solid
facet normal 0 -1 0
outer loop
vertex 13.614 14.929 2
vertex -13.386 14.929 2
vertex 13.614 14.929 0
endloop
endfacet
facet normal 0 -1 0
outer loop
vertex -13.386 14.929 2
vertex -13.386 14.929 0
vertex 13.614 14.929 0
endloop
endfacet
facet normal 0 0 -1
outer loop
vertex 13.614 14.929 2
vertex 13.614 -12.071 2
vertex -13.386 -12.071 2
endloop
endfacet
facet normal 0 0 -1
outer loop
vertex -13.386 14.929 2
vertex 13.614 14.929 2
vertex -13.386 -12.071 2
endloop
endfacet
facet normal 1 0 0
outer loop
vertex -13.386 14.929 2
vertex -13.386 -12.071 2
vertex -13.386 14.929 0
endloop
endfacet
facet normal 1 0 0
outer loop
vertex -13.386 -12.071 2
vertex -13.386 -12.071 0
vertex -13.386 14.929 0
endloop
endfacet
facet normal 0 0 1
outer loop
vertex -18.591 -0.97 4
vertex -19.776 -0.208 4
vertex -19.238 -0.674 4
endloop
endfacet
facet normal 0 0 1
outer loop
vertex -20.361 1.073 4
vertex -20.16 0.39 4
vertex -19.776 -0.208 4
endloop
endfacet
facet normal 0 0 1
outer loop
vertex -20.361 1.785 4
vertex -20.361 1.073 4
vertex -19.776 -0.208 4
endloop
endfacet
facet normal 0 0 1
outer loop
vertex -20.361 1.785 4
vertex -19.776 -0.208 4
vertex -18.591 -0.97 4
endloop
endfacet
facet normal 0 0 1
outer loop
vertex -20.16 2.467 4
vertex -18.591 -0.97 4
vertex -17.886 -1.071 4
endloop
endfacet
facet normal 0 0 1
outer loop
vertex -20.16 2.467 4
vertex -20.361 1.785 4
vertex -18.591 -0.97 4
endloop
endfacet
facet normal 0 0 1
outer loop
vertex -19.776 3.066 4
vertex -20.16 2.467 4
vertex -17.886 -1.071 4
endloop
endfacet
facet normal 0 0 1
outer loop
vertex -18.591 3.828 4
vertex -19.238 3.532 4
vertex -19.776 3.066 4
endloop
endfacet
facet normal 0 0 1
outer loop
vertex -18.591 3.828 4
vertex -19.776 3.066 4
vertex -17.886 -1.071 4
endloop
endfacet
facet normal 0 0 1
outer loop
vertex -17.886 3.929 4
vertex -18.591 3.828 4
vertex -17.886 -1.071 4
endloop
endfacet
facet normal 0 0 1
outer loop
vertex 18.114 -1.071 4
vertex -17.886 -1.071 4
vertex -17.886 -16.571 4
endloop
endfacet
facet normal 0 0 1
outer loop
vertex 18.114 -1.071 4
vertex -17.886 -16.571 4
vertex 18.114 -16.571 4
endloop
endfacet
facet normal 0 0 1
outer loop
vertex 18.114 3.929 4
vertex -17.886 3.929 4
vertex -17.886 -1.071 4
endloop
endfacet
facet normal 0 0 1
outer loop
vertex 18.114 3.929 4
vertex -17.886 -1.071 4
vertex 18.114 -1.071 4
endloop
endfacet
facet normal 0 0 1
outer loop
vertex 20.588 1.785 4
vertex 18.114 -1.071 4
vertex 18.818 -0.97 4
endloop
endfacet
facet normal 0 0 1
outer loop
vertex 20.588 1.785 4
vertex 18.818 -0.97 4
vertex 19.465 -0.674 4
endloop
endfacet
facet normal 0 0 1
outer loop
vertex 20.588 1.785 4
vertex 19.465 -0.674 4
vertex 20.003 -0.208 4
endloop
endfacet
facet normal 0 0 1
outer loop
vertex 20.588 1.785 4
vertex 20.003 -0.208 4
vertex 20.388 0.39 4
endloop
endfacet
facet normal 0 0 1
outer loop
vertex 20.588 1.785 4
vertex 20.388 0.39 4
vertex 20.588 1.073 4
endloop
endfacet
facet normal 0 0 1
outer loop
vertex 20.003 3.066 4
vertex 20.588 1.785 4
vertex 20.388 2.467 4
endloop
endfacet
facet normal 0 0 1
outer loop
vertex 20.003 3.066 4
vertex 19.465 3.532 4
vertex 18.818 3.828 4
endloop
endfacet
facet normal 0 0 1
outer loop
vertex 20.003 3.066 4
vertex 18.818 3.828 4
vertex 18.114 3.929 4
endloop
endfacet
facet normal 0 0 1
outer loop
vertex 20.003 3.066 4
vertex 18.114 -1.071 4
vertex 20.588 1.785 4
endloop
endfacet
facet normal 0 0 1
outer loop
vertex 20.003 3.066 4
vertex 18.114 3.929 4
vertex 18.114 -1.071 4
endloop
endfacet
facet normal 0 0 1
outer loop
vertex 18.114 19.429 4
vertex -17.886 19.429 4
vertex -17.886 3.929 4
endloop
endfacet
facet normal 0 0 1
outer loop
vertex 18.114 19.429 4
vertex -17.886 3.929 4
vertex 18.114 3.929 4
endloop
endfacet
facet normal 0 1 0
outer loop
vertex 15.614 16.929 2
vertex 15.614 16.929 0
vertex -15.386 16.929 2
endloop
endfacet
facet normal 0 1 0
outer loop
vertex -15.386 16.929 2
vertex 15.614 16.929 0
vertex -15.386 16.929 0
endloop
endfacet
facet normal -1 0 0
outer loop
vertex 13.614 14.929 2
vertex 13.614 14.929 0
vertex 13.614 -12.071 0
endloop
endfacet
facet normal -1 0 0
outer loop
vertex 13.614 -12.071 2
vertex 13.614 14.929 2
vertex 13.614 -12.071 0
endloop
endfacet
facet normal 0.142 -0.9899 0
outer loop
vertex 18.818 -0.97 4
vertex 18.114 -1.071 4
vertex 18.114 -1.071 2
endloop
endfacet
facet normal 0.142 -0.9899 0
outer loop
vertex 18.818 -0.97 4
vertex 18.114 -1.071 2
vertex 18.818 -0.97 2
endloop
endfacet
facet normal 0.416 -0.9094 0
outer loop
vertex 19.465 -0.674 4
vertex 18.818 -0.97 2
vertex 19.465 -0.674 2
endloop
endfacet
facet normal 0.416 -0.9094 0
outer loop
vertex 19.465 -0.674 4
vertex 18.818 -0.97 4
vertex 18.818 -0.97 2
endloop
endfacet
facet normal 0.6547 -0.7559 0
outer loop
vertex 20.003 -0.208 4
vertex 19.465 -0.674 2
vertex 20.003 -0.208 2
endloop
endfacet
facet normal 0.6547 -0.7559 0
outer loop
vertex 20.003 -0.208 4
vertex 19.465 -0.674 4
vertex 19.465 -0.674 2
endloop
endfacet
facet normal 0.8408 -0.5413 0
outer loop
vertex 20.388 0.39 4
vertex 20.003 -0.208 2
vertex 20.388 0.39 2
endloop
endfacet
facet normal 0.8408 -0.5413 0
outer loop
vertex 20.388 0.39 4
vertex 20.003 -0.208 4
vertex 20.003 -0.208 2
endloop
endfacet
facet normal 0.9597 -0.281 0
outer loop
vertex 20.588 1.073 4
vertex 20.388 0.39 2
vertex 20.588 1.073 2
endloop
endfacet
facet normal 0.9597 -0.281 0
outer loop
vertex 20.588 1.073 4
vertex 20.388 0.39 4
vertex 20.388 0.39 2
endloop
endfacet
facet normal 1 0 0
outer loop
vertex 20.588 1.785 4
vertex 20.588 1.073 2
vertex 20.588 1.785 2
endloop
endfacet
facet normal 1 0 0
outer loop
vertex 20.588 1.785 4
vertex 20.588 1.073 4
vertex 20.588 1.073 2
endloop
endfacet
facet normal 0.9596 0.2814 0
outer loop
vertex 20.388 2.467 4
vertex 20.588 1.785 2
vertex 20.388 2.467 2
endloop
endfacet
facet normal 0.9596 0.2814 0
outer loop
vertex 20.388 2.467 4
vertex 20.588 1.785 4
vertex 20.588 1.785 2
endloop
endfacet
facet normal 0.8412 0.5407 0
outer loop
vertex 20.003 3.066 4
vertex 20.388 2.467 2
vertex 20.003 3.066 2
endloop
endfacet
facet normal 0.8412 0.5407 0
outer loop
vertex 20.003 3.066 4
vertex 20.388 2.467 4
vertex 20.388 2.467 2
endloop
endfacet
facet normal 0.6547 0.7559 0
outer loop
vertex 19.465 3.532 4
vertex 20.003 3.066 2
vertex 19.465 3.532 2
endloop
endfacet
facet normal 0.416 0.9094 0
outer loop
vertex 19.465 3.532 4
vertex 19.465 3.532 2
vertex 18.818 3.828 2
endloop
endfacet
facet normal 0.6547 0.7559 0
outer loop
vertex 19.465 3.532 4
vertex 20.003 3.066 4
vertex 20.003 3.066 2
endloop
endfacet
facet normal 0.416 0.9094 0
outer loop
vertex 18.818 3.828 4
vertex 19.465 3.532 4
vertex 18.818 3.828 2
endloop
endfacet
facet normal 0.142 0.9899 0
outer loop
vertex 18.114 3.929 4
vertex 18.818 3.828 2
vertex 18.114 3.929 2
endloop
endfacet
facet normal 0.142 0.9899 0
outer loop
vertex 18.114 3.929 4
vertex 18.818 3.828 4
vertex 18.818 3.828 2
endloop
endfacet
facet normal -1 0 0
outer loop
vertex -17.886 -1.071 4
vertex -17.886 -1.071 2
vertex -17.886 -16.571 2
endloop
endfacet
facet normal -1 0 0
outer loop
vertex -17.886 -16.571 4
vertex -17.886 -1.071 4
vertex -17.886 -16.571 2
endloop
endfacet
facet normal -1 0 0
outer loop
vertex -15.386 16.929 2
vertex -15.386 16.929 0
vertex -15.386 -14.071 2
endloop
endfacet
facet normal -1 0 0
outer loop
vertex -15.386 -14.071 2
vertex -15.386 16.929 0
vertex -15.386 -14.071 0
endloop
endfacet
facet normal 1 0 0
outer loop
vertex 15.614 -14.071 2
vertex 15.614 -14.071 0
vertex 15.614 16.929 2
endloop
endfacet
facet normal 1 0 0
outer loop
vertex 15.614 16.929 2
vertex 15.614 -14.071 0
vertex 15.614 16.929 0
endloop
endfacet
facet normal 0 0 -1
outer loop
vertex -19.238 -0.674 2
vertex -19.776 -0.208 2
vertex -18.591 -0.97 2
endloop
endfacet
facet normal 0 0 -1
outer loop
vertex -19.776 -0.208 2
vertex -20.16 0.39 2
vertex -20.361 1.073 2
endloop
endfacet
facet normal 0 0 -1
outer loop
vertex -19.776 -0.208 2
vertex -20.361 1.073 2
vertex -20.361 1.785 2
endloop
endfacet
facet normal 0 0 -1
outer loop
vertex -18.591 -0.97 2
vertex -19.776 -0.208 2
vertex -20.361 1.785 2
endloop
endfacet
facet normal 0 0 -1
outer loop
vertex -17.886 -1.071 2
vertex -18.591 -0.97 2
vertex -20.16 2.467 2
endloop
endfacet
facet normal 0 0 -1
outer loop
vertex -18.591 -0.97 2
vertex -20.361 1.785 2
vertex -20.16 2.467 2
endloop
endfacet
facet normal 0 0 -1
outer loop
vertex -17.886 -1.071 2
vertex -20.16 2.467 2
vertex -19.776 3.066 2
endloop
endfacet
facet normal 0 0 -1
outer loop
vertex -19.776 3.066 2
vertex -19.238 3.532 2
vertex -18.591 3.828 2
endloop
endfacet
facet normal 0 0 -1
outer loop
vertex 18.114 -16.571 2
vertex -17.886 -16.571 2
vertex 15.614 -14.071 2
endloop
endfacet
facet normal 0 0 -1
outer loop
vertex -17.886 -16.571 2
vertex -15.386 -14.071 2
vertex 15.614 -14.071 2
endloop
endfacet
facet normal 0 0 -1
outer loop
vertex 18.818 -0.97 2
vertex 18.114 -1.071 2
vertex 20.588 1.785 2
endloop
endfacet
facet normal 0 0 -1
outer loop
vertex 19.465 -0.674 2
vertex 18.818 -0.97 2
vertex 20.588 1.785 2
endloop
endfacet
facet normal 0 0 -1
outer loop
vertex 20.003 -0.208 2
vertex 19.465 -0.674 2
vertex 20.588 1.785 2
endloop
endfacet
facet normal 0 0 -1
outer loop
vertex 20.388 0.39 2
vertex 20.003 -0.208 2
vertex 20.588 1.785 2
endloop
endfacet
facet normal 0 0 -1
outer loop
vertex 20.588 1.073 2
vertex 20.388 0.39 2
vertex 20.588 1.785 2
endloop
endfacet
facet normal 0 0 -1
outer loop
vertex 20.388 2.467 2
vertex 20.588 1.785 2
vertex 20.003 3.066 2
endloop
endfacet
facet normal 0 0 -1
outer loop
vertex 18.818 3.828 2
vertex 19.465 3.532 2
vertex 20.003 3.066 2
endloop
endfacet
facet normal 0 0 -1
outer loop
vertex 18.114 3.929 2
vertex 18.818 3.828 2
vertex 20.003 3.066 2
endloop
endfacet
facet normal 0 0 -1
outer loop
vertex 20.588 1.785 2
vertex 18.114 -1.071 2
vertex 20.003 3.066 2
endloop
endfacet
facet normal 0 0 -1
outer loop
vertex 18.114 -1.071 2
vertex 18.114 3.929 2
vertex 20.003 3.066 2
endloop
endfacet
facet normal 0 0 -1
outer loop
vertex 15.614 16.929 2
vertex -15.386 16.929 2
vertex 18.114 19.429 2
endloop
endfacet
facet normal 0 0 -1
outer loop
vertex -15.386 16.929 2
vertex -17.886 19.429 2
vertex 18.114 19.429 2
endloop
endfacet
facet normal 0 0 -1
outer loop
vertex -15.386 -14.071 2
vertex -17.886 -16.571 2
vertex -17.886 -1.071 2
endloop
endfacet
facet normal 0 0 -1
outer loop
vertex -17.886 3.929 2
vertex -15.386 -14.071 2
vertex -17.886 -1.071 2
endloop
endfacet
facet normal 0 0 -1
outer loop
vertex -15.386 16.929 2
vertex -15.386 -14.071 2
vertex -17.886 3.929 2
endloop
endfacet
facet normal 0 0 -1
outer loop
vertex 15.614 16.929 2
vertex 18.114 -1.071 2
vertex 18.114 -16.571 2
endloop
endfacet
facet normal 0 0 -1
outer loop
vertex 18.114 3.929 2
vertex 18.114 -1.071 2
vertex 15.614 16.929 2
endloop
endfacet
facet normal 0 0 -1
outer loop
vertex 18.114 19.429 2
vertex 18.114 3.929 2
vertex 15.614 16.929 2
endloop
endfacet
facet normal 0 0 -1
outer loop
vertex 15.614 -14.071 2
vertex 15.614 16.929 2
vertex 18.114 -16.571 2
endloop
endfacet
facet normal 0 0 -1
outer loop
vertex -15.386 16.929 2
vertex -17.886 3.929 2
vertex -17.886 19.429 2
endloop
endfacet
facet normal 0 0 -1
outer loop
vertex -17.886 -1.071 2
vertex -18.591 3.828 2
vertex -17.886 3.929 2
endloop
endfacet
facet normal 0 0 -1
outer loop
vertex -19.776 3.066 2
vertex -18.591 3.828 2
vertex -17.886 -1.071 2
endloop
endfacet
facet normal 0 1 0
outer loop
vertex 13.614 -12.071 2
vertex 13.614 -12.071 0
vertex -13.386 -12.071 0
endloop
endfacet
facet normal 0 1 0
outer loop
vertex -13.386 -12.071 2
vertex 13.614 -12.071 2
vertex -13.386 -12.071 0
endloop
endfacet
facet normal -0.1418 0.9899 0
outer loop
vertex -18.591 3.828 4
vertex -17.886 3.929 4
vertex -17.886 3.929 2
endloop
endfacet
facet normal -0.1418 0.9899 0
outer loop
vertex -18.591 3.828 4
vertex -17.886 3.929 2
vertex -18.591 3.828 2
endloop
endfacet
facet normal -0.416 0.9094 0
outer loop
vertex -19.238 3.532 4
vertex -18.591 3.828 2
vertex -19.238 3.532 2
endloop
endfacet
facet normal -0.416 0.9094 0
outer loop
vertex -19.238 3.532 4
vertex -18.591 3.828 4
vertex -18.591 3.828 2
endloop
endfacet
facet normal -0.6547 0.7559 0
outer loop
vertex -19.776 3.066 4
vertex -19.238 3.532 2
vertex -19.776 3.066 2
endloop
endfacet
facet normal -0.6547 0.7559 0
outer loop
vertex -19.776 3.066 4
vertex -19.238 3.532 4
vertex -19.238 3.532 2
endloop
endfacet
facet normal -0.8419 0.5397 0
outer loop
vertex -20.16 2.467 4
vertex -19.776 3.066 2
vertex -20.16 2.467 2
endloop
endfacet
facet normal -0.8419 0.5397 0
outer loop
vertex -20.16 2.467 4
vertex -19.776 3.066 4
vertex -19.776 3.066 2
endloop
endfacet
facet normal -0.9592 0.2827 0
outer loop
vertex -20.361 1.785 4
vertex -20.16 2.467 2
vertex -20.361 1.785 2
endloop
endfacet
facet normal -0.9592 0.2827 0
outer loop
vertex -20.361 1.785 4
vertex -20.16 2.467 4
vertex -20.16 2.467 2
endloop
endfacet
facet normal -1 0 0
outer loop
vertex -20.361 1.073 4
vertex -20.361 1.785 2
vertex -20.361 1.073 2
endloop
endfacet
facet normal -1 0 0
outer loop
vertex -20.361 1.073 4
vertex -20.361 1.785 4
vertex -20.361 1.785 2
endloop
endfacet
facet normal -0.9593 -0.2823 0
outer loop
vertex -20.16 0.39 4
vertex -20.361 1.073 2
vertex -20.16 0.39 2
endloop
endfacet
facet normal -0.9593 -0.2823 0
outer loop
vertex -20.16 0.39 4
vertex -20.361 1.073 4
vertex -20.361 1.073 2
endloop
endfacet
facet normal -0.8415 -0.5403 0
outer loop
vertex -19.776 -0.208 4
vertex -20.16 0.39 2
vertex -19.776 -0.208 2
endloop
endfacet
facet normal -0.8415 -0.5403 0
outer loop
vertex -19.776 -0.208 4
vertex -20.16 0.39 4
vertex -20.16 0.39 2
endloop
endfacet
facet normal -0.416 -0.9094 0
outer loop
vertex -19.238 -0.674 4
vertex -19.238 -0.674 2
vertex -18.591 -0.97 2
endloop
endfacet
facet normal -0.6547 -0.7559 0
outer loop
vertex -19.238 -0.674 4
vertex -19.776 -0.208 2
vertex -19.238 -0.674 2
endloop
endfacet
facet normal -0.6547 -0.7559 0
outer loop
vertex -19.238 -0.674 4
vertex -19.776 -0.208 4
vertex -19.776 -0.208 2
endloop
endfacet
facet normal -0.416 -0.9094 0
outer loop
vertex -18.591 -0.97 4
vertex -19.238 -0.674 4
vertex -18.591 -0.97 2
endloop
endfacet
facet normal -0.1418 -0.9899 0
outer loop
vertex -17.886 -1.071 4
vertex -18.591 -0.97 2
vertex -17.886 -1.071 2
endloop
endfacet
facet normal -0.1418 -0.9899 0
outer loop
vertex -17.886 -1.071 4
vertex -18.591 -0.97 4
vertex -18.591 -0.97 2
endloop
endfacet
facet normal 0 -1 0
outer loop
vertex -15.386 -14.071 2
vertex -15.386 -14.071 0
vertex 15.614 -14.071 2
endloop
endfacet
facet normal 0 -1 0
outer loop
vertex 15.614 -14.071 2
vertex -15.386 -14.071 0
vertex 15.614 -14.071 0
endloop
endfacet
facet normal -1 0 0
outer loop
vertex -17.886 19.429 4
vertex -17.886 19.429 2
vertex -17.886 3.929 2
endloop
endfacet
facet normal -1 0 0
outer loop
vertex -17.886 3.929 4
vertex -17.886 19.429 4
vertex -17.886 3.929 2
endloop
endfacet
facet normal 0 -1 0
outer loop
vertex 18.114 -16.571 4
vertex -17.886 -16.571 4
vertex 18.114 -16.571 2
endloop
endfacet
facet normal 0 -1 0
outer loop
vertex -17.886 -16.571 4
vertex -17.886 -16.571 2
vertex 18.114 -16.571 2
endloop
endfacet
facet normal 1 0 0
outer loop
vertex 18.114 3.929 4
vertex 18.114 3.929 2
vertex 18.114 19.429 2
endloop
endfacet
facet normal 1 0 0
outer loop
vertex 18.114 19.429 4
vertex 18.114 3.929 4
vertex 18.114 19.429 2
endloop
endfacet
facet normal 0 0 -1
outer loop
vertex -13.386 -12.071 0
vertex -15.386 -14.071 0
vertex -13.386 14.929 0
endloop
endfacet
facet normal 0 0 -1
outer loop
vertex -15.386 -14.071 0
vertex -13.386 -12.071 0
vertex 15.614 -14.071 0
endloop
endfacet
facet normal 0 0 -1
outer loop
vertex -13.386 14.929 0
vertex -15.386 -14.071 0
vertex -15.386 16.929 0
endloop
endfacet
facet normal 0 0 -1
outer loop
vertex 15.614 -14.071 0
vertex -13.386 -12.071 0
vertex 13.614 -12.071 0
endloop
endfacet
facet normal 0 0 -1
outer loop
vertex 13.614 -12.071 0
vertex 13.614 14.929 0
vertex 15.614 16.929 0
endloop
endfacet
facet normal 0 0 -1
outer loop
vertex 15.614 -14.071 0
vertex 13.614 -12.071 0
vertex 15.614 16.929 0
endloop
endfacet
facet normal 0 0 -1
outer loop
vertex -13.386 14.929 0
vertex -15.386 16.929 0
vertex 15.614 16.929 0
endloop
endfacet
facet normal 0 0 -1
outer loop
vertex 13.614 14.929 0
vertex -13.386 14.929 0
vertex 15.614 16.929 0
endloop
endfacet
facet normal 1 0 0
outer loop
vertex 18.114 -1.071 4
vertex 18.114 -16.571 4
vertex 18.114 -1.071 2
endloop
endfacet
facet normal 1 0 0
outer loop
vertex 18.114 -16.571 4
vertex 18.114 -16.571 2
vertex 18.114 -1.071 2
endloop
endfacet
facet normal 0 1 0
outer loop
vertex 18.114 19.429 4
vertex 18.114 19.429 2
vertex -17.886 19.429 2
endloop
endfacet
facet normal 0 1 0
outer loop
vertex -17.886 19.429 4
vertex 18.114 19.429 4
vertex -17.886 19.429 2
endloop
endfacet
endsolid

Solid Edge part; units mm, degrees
sketch "Sketch1" plane through (0, 0, 0) normal (0, 0, 1) x (1, 0, 0)
  line L0 (-15.3863, -14.0712) -> (15.6137, -14.0712)
  line L1 (15.6137, -14.0712) -> (15.6137, 16.9288)
  line L2 (15.6137, 16.9288) -> (-15.3863, 16.9288)
  line L3 (-15.3863, 16.9288) -> (-15.3863, -14.0712)
extrude "Protrusion1" add sketch "Sketch1" along normal blind 2
sketch "Sketch2" plane through (0.1137, 1.4288, 2) normal (0, 0, 1) x (1, 0, 0)
  line L0 (-18, -18) -> (18, -18)
  line L1 (18, -18) -> (18, 18)
  line L2 (18, 18) -> (-18, 18)
  line L3 (-18, 18) -> (-18, -18)
extrude "ExtrudedProtrusion_3" add sketch "Sketch2" along normal blind 2
sketch "Sketch3" plane through (0.1137, 1.4288, 0) normal (0, 0, -1) x (1, 0, 0)
  line L0 (-13.5, -13.5) -> (13.5, -13.5)
  line L1 (13.5, -13.5) -> (13.5, 13.5)
  line L2 (13.5, 13.5) -> (-13.5, 13.5)
  line L3 (-13.5, 13.5) -> (-13.5, -13.5)
extrude "ExtrudedCutout_1" cut sketch "Sketch3" against normal blind 2
sketch "Sketch4" plane through (0.1137, 1.4288, 4) normal (0, 0, 1) x (-1, 0, 0)
  line L0 (-18, -2.5) -> (-18, 2.5)
  arc A0 (-18, 2.5) -> (-18, -2.5) centre (-18, 0) ccw
  line L1 (18, -2.5) -> (18, 2.5)
  arc A1 (18, 2.5) -> (18, -2.5) centre (18, 0) cw
extrude "ExtrudedProtrusion_4" add sketch "Sketch4" against normal blind 2
